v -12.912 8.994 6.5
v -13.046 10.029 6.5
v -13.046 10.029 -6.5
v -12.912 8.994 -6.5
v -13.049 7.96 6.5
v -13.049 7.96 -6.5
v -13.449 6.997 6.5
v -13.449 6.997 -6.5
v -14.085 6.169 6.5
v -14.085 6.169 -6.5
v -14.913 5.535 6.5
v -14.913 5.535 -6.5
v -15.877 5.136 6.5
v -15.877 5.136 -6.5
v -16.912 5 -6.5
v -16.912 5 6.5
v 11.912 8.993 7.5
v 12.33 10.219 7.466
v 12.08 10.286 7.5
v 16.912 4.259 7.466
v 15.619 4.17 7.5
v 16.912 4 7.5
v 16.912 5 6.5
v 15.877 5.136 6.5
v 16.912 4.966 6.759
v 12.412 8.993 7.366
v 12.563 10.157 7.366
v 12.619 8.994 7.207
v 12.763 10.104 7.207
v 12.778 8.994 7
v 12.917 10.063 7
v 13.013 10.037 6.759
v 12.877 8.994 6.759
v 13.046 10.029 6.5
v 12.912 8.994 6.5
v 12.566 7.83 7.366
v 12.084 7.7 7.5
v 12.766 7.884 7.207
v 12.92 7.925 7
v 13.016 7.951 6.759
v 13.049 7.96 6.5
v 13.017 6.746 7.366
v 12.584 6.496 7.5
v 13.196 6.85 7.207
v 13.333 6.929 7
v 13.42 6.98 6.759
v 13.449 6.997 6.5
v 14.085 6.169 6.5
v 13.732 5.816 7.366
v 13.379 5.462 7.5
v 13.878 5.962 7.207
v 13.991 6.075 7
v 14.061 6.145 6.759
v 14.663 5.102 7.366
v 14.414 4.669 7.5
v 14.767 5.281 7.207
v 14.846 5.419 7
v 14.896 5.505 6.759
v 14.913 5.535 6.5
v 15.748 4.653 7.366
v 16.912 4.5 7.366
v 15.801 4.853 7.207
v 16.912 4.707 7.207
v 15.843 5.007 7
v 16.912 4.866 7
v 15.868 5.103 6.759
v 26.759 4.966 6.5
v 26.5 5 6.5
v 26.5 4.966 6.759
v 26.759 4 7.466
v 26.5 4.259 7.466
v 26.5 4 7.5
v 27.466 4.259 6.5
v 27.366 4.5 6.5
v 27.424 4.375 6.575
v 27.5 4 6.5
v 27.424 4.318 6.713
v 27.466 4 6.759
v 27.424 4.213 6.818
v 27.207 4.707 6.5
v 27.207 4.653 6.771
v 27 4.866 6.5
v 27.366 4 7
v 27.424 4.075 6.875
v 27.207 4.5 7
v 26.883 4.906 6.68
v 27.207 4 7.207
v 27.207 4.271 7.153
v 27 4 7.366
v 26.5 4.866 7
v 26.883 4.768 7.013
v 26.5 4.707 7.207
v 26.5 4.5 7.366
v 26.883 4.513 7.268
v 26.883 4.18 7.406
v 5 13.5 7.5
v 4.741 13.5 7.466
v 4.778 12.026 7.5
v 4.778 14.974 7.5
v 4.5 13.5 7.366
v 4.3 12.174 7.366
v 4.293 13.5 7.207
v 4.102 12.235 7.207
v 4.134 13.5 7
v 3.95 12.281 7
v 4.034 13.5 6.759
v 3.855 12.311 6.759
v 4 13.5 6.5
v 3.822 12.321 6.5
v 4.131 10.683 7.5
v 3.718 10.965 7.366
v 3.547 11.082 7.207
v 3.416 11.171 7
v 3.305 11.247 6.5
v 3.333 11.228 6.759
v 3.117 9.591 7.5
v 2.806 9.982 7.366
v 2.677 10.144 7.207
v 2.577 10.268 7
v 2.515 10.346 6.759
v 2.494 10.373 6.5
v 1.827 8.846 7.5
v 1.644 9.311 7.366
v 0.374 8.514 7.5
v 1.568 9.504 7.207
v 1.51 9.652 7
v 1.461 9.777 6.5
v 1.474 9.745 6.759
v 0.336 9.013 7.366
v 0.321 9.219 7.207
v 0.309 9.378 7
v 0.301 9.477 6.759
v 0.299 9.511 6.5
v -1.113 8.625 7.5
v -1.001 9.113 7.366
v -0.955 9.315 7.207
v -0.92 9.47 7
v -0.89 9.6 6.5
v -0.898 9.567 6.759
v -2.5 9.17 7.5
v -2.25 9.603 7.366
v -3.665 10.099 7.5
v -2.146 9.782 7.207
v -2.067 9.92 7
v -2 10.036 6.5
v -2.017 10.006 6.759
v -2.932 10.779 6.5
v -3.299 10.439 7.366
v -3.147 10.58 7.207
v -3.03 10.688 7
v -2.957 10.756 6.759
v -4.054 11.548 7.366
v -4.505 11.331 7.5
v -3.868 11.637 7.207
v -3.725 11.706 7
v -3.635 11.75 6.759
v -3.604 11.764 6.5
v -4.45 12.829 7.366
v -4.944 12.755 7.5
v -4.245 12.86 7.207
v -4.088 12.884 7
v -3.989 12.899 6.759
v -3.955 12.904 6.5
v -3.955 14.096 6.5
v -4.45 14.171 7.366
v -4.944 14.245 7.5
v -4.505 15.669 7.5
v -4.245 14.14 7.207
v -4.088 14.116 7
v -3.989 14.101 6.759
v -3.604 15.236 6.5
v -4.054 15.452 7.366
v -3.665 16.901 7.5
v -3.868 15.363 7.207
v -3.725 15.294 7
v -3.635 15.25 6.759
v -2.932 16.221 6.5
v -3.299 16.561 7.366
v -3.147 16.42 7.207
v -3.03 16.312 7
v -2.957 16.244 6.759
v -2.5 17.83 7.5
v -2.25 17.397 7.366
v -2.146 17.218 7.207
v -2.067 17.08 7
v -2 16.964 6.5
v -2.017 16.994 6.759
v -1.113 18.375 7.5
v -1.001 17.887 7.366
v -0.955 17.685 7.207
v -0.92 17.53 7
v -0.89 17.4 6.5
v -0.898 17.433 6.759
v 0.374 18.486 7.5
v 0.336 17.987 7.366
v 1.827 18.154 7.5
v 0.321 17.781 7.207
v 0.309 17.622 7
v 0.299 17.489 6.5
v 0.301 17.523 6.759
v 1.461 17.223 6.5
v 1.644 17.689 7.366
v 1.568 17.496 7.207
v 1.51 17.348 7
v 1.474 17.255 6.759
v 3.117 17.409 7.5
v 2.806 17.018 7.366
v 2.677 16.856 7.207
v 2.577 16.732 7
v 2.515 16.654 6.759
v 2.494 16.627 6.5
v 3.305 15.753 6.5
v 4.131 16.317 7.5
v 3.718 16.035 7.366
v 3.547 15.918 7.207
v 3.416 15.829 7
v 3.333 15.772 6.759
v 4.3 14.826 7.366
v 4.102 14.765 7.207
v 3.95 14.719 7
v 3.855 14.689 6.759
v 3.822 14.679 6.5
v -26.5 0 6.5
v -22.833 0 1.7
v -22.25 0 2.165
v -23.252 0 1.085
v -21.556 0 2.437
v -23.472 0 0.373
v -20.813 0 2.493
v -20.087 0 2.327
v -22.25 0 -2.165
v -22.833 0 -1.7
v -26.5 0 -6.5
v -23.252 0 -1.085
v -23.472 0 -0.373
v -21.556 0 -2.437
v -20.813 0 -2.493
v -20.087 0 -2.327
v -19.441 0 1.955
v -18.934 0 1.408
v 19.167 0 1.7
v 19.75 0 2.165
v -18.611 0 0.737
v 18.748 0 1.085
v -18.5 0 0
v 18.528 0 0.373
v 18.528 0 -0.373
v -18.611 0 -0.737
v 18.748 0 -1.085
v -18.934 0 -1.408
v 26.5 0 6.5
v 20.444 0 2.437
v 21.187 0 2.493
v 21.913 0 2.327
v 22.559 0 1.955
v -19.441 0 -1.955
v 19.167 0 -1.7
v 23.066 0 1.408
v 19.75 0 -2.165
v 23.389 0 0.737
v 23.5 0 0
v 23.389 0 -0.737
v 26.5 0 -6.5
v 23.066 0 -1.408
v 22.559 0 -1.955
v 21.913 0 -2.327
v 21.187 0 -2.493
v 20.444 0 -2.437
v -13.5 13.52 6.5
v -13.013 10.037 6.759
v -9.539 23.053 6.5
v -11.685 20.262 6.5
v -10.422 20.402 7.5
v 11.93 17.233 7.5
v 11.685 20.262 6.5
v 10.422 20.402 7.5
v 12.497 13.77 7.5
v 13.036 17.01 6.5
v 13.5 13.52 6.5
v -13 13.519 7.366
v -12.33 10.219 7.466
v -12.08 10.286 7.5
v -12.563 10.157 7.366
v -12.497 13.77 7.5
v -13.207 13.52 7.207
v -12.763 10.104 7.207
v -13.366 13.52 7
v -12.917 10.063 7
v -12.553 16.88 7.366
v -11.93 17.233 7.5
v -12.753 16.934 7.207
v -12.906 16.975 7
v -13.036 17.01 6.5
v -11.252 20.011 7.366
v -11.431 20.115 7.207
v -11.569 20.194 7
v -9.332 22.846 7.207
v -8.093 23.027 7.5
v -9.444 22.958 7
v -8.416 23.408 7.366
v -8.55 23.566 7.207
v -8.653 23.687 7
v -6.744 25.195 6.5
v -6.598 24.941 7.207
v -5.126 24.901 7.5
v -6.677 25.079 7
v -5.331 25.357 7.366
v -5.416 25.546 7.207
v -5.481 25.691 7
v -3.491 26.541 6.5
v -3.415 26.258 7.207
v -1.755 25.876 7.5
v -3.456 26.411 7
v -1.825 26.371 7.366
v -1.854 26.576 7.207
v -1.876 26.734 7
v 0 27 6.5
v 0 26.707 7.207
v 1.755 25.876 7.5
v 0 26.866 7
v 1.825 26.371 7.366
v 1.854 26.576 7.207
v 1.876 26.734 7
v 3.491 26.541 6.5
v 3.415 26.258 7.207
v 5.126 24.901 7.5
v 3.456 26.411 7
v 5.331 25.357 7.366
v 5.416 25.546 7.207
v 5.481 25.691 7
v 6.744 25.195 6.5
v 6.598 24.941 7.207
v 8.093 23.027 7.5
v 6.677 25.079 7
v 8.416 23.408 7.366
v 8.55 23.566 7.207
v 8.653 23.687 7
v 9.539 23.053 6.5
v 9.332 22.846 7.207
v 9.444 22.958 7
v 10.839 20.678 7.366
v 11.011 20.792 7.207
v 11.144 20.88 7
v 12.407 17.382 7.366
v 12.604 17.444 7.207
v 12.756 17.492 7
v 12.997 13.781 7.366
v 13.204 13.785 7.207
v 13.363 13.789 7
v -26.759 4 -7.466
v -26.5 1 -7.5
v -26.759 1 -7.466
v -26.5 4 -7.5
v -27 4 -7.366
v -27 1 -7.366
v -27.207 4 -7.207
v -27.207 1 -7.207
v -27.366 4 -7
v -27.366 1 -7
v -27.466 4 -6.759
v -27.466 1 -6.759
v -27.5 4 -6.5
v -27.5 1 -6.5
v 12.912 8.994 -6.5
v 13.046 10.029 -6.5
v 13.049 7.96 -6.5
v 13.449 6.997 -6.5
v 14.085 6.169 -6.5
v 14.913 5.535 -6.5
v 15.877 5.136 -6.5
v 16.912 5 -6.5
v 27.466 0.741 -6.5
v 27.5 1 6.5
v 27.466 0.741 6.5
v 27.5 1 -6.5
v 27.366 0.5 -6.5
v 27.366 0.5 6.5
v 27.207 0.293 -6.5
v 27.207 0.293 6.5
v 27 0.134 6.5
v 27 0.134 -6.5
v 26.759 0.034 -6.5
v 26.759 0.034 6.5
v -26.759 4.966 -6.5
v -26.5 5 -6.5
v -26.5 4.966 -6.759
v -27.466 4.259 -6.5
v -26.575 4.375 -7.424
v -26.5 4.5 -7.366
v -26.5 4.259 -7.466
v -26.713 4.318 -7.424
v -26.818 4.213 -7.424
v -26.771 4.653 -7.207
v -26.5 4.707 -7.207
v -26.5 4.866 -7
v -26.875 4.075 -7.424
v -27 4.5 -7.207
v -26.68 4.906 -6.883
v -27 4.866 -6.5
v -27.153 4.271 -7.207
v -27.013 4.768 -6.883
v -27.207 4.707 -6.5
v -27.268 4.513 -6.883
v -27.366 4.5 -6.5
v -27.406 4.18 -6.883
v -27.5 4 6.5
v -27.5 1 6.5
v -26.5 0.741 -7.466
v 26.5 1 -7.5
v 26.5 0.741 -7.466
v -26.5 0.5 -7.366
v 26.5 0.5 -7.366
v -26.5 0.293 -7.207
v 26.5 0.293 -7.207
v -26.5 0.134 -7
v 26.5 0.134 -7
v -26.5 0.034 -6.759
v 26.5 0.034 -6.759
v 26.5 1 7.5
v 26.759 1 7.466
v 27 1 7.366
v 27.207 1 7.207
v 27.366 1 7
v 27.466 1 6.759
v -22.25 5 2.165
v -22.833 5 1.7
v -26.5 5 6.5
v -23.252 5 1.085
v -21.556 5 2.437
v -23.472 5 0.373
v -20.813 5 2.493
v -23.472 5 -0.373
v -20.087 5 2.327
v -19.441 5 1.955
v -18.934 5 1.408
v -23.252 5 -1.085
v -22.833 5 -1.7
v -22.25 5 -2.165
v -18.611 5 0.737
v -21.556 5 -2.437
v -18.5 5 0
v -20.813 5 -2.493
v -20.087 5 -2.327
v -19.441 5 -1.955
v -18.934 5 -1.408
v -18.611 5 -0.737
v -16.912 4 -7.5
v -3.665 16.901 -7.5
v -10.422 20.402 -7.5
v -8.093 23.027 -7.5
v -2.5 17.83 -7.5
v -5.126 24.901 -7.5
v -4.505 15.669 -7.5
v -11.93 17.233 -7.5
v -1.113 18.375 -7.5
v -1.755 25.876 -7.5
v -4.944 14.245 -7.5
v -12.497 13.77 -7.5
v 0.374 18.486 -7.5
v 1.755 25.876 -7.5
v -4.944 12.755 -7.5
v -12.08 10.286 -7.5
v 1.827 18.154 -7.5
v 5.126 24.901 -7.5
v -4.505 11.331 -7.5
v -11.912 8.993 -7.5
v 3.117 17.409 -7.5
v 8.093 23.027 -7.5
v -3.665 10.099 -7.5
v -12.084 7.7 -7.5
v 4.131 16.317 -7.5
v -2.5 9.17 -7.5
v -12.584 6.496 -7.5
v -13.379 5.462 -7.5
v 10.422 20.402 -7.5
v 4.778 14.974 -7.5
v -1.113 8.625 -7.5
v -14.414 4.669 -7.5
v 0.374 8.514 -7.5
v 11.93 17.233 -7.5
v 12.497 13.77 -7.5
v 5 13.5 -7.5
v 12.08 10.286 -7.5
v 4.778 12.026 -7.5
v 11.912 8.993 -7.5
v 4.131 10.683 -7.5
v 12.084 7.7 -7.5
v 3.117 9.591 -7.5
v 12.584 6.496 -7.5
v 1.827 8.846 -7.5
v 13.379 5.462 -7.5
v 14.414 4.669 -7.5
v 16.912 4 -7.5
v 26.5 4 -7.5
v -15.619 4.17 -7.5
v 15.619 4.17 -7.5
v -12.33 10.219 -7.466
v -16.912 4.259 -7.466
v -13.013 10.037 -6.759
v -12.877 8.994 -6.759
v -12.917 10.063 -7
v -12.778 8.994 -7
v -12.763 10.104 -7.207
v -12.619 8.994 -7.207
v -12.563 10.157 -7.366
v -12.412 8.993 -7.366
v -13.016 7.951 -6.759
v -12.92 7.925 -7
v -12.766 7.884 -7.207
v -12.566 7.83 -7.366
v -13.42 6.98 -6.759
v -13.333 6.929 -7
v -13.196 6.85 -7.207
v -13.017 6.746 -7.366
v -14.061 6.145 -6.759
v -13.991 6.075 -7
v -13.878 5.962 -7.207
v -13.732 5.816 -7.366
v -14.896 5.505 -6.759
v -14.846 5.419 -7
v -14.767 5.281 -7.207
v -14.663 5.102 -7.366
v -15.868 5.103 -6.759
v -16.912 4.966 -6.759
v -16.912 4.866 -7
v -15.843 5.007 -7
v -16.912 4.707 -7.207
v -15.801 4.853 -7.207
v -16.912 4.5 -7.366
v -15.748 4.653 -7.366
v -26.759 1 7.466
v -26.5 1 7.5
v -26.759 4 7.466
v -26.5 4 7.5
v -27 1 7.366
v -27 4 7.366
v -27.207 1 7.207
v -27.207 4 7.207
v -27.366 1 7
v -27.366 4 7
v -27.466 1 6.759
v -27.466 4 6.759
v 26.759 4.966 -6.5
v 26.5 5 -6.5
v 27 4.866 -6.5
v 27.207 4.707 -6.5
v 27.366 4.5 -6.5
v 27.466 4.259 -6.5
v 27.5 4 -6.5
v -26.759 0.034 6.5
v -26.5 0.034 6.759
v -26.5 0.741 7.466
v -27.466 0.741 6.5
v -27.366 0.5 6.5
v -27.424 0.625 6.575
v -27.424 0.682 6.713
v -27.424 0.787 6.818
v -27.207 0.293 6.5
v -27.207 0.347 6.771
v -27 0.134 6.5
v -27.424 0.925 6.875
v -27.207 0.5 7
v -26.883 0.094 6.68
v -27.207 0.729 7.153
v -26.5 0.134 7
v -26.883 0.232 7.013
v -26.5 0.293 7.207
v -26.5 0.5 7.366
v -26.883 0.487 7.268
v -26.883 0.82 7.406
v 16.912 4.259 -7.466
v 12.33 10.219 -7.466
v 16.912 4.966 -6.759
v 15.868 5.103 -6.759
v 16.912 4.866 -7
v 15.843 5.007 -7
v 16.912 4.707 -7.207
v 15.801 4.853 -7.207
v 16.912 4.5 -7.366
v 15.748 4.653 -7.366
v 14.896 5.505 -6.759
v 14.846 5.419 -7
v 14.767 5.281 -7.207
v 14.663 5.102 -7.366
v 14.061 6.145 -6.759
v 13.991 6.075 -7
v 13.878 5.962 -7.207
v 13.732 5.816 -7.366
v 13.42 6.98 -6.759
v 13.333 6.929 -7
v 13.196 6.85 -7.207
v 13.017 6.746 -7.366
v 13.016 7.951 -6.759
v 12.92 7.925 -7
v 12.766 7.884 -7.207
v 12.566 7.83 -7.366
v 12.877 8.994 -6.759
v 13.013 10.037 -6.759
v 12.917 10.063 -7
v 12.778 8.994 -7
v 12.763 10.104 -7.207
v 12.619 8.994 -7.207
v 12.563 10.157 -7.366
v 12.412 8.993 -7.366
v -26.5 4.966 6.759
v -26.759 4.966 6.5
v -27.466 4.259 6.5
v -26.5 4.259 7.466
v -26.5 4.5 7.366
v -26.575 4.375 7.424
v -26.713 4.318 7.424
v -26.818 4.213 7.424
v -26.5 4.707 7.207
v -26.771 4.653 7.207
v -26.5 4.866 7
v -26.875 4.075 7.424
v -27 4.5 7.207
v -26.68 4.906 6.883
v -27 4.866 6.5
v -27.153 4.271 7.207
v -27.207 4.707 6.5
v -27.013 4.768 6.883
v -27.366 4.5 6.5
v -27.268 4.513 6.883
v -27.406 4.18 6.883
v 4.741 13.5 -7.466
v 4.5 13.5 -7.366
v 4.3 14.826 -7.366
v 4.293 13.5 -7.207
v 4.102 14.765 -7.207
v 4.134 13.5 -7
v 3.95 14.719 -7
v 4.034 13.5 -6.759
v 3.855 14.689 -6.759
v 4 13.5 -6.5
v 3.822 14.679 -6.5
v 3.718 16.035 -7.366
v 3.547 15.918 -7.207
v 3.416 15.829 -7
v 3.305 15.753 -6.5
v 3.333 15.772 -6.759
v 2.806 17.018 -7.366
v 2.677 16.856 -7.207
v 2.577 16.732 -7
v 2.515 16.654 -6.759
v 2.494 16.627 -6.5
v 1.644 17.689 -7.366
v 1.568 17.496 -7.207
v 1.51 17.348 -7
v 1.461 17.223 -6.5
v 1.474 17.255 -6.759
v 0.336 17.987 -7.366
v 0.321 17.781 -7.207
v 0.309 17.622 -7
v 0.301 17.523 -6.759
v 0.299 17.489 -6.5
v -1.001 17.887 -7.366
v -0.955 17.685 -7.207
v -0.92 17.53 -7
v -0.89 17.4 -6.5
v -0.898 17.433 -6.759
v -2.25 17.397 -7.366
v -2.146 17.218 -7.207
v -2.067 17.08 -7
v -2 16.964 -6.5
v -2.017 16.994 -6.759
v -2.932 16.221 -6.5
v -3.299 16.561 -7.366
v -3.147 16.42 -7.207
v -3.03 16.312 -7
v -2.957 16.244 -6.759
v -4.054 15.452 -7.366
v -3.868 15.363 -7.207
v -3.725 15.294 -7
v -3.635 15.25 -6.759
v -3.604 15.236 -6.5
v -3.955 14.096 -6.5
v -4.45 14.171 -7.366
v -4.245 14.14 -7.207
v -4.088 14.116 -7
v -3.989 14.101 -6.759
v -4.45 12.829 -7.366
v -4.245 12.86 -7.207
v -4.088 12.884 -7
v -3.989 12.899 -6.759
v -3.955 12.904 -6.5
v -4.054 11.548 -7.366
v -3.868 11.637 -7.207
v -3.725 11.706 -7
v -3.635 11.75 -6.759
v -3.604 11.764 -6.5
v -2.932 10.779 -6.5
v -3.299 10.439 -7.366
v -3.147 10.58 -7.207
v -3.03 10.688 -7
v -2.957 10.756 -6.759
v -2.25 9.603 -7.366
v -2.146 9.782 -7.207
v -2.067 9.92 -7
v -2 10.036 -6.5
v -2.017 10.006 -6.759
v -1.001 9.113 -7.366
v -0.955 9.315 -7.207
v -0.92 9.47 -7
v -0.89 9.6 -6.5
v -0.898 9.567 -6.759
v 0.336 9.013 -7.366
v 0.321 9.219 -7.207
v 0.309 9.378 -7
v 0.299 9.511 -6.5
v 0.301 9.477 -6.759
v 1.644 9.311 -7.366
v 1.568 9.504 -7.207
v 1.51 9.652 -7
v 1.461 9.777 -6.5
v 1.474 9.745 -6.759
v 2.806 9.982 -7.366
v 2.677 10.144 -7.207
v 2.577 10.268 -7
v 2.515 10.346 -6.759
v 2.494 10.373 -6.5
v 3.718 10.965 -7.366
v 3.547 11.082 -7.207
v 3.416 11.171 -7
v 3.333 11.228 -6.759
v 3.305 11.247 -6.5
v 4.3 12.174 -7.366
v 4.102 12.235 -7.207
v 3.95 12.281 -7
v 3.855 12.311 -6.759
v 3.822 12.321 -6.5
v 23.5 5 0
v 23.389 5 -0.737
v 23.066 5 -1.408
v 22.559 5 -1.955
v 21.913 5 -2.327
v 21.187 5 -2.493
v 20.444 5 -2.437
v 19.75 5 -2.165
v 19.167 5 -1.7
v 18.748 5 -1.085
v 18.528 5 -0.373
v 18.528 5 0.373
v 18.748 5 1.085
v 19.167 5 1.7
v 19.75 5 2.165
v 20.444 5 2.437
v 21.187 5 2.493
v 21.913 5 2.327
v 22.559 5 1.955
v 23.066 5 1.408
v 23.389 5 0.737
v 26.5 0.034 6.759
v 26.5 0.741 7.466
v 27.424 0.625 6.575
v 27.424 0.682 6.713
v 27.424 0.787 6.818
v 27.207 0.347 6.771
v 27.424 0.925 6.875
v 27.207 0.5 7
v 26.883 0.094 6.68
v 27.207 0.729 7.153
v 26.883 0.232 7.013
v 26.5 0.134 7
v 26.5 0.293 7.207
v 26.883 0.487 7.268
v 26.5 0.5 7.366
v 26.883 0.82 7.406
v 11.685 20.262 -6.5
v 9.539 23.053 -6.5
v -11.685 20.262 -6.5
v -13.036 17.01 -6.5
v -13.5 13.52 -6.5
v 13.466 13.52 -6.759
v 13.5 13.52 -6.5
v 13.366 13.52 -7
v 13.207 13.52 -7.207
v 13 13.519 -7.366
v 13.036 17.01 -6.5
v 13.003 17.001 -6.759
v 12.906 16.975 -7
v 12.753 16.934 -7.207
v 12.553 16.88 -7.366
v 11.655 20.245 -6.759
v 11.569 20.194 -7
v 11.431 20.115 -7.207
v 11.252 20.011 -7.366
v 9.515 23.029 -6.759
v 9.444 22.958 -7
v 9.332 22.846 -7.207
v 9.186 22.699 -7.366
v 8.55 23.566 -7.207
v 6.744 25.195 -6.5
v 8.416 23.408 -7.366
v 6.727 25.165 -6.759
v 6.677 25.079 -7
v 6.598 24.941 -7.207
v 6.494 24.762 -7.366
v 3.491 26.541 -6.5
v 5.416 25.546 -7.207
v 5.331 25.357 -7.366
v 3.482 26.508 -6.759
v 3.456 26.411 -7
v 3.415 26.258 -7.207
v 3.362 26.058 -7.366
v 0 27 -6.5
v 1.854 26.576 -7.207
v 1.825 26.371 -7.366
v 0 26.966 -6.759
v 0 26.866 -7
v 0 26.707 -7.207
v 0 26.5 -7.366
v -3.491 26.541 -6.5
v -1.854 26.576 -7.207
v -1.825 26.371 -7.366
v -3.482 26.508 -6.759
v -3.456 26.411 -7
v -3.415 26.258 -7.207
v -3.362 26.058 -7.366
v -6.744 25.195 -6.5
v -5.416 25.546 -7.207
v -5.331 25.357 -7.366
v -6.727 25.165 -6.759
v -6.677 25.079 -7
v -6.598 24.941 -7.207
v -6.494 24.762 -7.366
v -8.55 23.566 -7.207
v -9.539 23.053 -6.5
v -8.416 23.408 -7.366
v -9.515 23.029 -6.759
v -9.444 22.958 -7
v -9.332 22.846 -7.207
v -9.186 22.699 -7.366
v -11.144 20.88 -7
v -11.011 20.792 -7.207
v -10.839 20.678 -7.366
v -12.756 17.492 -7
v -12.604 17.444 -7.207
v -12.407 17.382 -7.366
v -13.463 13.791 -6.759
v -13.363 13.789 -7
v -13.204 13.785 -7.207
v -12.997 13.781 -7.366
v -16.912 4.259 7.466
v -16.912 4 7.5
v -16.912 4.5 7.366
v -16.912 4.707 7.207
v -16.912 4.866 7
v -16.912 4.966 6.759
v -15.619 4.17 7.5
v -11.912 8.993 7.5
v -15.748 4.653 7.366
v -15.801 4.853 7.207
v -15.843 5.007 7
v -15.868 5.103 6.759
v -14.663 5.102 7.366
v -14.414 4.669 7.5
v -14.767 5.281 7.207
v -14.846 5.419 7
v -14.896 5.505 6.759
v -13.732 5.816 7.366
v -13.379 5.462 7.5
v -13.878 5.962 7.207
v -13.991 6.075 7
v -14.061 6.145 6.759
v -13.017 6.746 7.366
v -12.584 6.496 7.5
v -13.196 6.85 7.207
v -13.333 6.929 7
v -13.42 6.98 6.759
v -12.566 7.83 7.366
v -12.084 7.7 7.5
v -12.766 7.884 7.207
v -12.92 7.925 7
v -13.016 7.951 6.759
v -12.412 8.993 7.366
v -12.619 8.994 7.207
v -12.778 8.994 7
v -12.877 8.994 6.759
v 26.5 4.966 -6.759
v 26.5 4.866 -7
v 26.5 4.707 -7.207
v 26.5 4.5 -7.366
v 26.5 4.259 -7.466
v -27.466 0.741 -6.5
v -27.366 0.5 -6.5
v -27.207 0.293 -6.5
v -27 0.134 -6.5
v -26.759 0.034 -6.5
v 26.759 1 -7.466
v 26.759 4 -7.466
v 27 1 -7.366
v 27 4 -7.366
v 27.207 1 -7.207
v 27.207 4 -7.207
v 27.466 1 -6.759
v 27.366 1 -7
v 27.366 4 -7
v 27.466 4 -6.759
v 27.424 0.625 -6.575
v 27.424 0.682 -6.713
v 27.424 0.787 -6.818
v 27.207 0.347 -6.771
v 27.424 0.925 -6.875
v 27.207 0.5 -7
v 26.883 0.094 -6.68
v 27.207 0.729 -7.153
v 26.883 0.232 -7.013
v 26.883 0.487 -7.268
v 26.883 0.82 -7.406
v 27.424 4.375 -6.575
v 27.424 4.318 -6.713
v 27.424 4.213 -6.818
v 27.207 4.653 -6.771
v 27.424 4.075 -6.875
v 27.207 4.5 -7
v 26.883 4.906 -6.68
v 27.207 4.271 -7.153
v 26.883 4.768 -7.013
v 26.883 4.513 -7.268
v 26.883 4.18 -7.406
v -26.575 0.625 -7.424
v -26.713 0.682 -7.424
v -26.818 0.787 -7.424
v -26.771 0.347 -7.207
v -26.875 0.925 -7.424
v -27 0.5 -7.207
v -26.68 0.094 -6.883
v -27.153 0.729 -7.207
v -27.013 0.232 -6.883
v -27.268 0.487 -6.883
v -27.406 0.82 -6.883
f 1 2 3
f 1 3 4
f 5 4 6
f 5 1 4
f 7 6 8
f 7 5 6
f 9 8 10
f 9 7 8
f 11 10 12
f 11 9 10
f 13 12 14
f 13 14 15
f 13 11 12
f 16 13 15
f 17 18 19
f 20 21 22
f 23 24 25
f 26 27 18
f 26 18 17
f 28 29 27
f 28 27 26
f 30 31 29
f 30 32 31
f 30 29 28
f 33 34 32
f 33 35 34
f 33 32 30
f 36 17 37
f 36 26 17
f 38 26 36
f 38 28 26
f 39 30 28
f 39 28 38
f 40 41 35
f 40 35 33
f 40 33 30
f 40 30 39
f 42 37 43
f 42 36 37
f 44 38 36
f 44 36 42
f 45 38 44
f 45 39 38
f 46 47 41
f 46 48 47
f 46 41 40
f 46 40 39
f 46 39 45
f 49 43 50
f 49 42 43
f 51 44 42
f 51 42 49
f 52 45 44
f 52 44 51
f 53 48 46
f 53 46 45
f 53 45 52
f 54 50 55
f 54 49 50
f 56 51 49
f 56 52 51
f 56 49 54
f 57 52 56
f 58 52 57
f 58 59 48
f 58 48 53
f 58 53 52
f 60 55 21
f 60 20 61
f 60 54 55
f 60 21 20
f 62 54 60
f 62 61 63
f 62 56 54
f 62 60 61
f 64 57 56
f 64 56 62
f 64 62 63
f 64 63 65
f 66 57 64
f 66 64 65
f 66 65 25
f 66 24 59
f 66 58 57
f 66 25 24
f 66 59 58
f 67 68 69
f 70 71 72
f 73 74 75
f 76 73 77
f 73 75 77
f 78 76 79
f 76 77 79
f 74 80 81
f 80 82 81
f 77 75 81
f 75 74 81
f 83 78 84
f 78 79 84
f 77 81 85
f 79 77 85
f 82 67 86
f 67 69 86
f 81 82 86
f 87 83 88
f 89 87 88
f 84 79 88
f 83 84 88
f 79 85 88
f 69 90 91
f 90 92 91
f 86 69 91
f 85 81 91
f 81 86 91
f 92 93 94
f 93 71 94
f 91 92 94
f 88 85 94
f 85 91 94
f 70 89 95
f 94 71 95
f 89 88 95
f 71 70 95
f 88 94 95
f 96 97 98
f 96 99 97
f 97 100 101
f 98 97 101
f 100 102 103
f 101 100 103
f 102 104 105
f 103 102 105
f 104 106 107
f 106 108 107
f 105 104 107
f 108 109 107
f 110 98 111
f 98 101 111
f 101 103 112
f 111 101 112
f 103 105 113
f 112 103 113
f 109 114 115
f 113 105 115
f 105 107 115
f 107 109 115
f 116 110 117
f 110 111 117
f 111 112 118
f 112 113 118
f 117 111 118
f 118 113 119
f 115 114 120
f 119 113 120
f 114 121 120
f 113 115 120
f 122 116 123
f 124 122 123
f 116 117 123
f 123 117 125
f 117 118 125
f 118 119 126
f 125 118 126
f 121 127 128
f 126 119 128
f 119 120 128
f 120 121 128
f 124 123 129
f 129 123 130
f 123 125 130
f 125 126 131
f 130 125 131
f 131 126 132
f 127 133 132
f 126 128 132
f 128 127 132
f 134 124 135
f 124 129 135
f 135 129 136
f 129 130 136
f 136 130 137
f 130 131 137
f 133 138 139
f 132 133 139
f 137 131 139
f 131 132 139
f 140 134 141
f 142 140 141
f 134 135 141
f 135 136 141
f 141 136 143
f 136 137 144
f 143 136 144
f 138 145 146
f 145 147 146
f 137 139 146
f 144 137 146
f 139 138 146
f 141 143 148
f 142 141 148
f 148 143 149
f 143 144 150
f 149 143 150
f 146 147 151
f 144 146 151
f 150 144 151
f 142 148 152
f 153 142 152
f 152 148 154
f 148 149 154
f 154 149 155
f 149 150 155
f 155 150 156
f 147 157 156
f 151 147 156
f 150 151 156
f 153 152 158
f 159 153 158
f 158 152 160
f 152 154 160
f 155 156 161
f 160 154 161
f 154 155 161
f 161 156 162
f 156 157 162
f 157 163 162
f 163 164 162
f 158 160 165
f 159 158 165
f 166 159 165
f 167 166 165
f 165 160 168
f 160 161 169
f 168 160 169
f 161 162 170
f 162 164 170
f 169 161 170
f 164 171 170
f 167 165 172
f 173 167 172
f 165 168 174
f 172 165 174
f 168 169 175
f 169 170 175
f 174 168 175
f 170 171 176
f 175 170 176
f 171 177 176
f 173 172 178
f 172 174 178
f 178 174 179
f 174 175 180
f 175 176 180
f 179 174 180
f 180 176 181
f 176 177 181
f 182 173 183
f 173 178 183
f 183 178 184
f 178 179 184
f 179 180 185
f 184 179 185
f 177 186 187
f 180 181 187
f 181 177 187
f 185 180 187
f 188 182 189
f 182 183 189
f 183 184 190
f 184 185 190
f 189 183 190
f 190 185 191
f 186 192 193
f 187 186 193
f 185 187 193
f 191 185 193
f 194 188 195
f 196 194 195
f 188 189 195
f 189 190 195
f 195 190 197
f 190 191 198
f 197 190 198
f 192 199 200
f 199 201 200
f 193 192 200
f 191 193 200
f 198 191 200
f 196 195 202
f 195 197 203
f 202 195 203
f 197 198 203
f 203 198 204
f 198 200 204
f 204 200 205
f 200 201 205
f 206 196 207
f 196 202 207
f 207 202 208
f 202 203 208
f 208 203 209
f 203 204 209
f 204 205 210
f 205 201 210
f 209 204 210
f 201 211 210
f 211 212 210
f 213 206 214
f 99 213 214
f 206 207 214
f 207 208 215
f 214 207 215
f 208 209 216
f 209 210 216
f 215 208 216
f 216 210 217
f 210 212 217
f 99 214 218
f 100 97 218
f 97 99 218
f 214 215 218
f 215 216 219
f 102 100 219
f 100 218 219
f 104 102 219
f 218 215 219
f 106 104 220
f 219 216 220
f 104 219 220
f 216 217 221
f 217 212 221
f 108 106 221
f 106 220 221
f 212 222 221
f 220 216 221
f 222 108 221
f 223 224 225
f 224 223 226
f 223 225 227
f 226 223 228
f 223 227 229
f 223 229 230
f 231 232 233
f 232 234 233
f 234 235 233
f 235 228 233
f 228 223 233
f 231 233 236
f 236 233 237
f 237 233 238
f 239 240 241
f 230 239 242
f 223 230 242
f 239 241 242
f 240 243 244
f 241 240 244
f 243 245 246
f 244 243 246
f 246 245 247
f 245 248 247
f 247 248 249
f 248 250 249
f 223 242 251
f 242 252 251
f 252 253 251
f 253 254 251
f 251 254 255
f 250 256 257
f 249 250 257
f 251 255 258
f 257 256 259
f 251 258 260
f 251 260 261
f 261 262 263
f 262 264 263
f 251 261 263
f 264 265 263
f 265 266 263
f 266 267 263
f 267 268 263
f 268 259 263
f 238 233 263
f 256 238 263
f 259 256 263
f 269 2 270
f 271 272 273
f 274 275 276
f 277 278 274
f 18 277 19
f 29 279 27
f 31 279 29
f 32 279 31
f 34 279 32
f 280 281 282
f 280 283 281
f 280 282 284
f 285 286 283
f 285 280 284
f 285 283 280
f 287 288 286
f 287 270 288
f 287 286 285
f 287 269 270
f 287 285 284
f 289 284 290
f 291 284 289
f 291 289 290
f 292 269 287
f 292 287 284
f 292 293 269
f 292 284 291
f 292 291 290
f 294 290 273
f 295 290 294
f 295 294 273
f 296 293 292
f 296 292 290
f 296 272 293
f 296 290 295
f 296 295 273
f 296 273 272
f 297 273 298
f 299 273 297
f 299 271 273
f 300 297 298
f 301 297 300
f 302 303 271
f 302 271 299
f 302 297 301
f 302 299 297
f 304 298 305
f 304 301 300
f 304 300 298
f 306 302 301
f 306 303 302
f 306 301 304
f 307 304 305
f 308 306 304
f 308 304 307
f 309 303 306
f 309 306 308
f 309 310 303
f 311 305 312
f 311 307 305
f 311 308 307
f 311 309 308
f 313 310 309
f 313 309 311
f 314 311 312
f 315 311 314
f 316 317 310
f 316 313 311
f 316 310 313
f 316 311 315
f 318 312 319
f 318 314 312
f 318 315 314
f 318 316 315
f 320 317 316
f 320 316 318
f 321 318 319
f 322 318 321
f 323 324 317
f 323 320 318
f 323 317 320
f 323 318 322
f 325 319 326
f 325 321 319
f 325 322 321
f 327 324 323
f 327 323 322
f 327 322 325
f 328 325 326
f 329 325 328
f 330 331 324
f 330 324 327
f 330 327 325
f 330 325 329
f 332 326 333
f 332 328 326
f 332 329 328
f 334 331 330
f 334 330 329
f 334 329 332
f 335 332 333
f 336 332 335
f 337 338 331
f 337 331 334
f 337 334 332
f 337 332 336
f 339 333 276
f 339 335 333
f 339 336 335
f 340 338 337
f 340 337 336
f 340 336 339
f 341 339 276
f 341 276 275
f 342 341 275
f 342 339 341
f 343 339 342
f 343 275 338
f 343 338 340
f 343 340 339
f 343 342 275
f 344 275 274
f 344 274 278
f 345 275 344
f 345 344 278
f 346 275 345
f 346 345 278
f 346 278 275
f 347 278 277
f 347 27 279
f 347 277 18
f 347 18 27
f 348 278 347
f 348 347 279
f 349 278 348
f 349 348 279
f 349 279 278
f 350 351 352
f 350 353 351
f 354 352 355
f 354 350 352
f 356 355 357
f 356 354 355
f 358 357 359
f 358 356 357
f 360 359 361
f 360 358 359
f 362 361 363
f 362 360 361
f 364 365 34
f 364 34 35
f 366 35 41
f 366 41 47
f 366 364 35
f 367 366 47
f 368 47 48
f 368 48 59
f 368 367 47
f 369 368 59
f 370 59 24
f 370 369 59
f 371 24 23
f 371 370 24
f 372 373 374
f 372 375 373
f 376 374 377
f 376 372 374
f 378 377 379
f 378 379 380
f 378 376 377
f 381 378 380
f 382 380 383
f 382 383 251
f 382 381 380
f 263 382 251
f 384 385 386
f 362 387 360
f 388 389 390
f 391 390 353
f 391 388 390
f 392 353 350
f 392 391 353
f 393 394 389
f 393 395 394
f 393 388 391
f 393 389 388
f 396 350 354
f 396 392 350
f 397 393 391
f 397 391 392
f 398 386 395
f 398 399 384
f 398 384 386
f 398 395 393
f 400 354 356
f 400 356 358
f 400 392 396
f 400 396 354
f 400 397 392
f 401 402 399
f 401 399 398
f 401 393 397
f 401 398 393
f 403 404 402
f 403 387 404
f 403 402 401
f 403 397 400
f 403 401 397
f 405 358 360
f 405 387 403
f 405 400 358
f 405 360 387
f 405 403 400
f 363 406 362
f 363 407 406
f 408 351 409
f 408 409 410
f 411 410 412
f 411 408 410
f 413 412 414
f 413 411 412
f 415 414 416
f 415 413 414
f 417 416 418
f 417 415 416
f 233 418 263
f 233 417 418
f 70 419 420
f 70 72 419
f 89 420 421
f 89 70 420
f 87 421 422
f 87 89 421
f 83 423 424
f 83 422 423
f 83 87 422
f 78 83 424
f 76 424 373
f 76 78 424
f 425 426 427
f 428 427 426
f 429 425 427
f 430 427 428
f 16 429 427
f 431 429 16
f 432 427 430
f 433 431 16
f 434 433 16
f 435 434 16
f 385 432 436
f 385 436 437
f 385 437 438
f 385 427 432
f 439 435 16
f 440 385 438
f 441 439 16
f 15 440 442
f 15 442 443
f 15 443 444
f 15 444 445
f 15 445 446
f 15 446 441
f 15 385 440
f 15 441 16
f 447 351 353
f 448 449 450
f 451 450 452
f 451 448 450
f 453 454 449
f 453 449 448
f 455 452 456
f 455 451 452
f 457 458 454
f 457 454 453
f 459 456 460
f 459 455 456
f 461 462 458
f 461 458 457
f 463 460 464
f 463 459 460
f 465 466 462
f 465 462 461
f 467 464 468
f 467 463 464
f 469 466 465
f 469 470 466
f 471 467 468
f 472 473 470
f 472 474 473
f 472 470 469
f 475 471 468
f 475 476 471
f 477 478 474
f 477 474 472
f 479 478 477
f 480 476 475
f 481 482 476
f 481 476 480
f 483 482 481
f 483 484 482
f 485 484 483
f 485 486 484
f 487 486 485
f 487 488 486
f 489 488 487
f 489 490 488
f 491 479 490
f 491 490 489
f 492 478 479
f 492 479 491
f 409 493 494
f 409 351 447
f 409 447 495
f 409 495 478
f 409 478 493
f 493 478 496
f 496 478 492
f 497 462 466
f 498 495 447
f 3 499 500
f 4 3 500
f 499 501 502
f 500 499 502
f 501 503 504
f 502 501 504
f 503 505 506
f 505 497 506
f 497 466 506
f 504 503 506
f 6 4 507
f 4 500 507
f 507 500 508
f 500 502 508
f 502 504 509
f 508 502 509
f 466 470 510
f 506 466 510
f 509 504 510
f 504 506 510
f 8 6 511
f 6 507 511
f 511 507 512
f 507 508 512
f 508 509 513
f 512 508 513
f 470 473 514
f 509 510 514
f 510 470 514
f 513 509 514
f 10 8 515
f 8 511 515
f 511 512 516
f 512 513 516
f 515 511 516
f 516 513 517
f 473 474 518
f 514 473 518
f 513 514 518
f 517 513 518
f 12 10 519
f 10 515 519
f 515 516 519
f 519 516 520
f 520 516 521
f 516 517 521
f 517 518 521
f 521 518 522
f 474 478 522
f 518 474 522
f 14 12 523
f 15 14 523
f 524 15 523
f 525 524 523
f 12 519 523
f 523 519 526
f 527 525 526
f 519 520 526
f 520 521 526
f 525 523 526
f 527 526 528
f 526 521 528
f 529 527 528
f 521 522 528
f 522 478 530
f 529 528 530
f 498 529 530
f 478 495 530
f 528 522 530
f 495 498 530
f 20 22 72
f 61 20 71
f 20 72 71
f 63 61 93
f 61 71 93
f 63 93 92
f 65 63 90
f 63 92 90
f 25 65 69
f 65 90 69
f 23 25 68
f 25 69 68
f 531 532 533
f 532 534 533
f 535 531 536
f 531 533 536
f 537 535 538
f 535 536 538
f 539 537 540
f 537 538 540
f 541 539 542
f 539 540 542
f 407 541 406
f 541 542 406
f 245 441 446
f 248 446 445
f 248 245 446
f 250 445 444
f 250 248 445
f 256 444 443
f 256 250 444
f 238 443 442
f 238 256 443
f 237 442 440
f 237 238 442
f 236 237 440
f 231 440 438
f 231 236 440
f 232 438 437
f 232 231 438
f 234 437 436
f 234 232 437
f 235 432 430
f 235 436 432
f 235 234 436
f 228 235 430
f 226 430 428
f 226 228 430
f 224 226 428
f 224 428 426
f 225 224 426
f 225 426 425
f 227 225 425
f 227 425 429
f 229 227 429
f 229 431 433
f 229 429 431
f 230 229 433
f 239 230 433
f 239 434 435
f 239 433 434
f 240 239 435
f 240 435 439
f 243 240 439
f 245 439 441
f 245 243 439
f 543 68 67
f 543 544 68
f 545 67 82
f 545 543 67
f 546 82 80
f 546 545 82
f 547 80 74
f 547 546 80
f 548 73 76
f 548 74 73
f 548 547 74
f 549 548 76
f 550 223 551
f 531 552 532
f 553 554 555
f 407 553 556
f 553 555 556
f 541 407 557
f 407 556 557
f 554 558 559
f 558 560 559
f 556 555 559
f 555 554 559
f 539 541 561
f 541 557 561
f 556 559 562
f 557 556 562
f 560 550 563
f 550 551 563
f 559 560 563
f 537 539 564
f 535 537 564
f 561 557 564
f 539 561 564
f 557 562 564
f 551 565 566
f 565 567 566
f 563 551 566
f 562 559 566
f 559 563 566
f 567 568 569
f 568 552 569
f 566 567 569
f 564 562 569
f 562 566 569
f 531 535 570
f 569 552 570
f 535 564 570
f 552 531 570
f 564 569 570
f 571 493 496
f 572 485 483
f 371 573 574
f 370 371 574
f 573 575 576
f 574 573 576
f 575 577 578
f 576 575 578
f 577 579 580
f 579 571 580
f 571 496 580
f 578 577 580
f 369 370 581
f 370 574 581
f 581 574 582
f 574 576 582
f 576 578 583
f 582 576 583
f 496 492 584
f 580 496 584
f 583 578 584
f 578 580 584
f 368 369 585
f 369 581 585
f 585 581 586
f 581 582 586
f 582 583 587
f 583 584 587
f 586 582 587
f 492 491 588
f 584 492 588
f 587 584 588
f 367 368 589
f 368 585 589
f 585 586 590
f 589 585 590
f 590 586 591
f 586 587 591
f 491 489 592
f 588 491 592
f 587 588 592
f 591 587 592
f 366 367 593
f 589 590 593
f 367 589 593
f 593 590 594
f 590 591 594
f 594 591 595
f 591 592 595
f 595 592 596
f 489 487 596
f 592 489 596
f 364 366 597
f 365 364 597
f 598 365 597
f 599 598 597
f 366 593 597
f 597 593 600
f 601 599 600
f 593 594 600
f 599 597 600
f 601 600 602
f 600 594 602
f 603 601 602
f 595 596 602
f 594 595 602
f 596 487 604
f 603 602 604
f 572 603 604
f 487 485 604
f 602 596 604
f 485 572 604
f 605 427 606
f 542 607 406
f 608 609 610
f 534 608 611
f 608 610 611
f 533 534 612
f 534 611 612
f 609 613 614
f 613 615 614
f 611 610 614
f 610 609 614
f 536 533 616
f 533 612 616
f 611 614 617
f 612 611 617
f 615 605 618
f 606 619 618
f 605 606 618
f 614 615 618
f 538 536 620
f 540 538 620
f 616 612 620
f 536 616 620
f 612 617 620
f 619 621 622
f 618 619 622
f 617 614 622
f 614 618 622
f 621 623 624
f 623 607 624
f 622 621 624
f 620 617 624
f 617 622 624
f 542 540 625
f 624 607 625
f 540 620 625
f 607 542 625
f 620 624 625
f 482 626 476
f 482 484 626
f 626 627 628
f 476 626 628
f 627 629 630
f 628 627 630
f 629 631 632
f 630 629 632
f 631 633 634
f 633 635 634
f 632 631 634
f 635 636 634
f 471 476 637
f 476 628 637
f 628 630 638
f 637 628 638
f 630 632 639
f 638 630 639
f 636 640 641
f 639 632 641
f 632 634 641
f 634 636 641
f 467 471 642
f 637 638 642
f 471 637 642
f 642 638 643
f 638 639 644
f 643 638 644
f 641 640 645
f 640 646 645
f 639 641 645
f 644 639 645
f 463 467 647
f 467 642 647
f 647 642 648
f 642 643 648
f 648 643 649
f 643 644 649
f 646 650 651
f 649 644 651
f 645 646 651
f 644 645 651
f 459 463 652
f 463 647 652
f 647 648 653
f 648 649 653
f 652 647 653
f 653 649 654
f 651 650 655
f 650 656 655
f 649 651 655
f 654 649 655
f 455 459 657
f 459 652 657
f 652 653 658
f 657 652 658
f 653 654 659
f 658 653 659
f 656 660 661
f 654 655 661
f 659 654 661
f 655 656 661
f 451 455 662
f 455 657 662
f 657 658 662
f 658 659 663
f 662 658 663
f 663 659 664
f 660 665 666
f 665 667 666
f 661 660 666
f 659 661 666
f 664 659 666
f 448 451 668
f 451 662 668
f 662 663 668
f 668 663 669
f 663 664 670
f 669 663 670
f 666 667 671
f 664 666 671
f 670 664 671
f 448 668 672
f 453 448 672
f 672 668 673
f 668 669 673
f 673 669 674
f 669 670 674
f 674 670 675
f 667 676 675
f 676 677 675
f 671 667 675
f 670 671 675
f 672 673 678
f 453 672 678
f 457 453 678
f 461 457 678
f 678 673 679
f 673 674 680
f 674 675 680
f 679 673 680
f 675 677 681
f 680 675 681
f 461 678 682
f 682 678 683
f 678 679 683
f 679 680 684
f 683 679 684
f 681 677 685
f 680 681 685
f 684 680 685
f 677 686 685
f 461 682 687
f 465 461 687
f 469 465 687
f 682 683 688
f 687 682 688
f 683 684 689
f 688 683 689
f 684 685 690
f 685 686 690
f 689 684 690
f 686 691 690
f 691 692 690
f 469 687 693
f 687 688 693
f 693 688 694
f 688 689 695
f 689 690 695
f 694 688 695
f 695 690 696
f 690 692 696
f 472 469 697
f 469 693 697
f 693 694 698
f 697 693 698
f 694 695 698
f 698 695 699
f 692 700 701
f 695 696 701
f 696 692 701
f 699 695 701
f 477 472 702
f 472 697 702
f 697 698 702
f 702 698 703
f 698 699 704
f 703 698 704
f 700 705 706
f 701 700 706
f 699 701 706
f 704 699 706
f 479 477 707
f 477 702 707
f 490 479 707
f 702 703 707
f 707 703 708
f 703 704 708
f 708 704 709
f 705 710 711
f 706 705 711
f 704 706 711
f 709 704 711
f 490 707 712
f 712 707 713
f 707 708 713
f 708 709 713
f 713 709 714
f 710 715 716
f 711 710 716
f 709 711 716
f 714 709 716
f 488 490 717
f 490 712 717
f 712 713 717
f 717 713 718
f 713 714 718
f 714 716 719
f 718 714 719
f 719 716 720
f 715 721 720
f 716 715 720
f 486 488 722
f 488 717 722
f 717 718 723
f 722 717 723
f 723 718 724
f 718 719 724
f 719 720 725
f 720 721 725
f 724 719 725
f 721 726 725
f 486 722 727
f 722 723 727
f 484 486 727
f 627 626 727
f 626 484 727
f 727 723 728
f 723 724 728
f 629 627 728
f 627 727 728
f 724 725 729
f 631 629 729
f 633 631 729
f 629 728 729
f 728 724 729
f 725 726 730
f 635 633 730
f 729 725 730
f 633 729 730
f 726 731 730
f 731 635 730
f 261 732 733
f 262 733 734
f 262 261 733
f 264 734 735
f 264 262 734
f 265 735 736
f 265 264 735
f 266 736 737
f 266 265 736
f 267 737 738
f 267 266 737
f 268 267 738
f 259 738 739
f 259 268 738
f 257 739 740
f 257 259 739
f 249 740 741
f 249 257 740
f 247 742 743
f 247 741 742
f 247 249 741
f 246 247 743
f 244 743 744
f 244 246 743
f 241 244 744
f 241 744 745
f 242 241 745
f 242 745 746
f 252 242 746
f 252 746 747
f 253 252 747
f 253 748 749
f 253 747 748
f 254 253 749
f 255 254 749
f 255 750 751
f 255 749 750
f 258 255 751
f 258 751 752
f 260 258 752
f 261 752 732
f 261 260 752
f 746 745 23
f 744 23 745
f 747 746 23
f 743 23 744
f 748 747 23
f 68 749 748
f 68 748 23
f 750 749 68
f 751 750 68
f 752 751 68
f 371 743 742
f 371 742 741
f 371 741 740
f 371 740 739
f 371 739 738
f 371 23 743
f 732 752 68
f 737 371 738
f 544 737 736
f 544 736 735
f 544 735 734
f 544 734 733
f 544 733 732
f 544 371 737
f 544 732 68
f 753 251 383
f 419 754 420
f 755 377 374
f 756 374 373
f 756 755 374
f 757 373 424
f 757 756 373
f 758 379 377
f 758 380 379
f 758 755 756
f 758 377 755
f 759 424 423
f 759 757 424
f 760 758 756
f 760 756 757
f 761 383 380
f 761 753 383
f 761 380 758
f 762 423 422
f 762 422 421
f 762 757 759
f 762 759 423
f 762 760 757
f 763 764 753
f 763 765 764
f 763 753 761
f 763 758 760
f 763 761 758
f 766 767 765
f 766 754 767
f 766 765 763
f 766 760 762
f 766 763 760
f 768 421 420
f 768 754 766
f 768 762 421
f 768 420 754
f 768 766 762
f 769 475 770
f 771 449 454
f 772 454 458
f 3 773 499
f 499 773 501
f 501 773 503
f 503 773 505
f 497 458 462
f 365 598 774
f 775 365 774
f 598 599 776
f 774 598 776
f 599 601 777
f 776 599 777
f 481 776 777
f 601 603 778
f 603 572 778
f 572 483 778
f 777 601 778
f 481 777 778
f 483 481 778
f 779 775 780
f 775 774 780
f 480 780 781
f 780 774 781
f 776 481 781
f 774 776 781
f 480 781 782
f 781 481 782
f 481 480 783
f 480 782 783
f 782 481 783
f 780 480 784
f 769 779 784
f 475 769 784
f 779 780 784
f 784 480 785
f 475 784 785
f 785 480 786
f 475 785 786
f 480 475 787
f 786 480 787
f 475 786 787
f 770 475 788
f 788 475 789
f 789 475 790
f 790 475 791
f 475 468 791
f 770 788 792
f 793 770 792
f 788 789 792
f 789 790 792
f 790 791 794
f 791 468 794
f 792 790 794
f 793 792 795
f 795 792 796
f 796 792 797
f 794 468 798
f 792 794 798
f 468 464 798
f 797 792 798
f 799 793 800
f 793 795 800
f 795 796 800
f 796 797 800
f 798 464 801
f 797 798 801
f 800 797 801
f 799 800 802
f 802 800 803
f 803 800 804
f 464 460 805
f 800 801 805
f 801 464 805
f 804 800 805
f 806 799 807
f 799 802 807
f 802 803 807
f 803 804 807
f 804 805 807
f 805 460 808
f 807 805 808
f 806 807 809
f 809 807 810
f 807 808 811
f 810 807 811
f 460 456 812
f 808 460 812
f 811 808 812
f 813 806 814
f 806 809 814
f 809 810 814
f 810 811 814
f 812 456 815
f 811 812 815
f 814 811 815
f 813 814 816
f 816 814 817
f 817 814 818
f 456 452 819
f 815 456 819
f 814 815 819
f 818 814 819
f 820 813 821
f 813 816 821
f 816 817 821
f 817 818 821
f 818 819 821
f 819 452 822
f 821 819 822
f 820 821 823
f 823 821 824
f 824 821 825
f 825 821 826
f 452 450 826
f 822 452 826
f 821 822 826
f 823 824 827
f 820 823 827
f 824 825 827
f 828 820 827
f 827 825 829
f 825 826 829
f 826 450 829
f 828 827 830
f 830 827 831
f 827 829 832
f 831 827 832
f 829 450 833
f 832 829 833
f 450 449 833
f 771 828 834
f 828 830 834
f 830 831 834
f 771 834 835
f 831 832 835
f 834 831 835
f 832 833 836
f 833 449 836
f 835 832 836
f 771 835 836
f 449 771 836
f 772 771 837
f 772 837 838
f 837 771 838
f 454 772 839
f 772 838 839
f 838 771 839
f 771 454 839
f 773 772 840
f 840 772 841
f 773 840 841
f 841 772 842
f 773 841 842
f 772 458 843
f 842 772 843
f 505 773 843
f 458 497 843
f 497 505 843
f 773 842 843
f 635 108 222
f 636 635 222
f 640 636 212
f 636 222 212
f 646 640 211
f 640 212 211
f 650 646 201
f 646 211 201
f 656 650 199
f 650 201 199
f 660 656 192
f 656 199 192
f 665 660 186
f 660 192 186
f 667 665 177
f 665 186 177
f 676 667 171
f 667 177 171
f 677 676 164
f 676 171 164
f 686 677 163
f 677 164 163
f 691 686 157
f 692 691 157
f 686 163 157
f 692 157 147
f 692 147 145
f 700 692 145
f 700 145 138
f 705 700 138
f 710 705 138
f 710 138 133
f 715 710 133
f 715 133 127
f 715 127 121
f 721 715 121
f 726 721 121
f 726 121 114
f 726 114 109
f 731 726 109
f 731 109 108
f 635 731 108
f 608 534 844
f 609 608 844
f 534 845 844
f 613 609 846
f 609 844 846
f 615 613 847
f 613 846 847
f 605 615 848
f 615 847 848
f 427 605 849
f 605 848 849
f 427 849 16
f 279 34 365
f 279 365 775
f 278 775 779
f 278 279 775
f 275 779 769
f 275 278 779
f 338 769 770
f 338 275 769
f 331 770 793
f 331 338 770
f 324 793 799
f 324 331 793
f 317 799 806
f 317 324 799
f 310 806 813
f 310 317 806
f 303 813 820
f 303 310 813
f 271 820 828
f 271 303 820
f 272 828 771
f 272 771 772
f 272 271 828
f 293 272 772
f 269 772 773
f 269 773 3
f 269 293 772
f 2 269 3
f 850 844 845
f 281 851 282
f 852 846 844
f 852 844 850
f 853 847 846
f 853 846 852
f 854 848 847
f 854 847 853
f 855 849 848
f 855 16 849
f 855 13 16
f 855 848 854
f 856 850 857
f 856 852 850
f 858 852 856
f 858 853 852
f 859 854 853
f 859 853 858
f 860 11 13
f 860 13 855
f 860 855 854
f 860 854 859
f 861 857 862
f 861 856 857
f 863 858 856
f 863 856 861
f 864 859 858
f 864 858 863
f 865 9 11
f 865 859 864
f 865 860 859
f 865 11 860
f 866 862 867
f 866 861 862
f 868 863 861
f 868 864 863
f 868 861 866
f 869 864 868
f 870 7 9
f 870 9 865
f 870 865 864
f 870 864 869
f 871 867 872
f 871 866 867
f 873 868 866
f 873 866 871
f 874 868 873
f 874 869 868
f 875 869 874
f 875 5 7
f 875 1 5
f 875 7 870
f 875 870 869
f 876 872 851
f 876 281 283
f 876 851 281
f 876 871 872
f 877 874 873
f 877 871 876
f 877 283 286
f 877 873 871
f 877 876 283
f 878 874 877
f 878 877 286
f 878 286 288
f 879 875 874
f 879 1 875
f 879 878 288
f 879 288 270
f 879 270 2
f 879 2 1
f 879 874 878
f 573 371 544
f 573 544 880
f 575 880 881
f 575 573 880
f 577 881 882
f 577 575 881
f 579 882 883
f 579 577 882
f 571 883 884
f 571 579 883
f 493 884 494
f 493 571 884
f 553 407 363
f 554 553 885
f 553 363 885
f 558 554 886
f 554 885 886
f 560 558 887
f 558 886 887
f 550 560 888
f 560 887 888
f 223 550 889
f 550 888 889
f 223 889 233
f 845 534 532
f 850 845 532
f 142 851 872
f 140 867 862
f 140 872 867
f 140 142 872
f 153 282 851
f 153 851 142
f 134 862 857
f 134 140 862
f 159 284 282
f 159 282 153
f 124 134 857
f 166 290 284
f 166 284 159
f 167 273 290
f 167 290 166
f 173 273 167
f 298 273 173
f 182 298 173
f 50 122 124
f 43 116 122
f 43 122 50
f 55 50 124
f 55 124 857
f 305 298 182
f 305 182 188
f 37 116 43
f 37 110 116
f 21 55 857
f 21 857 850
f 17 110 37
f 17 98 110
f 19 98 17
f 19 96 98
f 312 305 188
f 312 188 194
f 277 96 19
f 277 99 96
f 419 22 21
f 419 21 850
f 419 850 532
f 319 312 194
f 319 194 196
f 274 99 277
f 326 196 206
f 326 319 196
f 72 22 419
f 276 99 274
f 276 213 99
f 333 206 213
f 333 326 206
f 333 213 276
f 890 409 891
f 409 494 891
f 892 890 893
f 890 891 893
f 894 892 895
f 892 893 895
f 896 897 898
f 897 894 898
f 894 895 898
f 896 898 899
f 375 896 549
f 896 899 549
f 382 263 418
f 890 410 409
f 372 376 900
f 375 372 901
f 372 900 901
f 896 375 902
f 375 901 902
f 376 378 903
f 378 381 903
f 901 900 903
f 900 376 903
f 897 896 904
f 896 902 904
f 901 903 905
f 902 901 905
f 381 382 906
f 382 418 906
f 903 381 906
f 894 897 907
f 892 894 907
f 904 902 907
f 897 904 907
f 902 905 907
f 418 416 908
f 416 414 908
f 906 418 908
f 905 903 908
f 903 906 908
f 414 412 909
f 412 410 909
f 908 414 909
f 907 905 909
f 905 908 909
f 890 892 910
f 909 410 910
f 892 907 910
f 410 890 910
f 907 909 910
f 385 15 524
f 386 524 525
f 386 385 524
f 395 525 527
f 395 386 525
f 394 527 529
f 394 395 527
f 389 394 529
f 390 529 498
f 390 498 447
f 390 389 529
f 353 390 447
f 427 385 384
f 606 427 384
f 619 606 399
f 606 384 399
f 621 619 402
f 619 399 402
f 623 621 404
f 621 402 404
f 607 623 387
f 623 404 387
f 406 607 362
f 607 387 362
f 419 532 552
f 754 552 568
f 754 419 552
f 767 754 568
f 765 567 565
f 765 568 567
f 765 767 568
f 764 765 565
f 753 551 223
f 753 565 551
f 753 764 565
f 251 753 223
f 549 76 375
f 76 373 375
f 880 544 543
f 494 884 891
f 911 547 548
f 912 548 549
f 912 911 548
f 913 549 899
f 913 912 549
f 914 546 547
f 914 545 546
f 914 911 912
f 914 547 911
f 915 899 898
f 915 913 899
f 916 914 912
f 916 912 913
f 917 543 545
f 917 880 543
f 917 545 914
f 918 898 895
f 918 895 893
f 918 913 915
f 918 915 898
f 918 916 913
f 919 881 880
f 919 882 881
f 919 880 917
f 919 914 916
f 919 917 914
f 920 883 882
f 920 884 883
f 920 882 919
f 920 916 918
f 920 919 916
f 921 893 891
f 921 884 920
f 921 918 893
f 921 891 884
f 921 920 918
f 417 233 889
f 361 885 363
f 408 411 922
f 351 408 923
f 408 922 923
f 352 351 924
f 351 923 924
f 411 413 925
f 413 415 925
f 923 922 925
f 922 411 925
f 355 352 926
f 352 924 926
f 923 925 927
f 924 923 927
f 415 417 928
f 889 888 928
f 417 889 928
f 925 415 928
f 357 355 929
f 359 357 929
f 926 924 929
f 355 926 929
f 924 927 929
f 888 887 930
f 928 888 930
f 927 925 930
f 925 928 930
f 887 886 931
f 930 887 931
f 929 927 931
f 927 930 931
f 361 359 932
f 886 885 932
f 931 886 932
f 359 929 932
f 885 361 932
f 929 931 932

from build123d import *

# Parameters (mm, degrees)
SCHIZZO1_W                               = 55
SCHIZZO1_H                               = 15
ESTRUSIONE_ESTRUSIONE1_DEPTH             = 5
ESTRUSIONE_ESTRUSIONE2_REACH             = 9.5
SCHIZZO2_R                               = 13.5
SCHIZZO2_R_2                             = 4
ESTRUSIONE_ESTRUSIONE2_DIRECTION_2_REACH = 9.5
RACCORDO1_R                              = 4
RACCORDO2_R                              = 1
SCHIZZO3_R                               = 2.5
TAGLIO_ESTRUSIONE1_DEPTH                 = 28


with BuildPart() as part:
    # Schizzo1 → Estrusione-Estrusione1 (new body)
    with BuildSketch(Plane(origin=(0, 0, 0), x_dir=(1, 0, 0), z_dir=(0, 1, 0))):
        Rectangle(SCHIZZO1_W, SCHIZZO1_H)
    extrude(amount=ESTRUSIONE_ESTRUSIONE1_DEPTH)

    # Estrusione-Estrusione2: up to this face of the body (flat: up to its plane)
    estrusione_estrusione2_end = Plane(part.part.faces().sort_by_distance((0, 2.5, 7.5))[0])
    # Schizzo2 → Estrusione-Estrusione2 (add, up to the picked face)
    with BuildSketch(Plane.XY, mode=Mode.PRIVATE) as estrusione_estrusione2_sk1:
        with Locations((0, 13.5)):
            Circle(SCHIZZO2_R)
        with Locations((0, 13.5)):
            Circle(SCHIZZO2_R_2, mode=Mode.SUBTRACT)
    estrusione_estrusione2_tool1 = split(extrude(estrusione_estrusione2_sk1.sketch, amount=ESTRUSIONE_ESTRUSIONE2_REACH, mode=Mode.PRIVATE), bisect_by=estrusione_estrusione2_end, keep=Keep.BOTH, mode=Mode.PRIVATE)
    add(estrusione_estrusione2_tool1.solids().sort_by_distance((-13.118162, 13.5, 0))[0])

    # Estrusione-Estrusione2 direction 2: up to this face of the body (flat: up to its plane)
    estrusione_estrusione2_direction_2_end = Plane(part.part.faces().sort_by_distance((0, 2.5, -7.5))[0])
    # Schizzo2 → Estrusione-Estrusione2 direction 2 (add, up to the picked face)
    with BuildSketch(Plane.XY, mode=Mode.PRIVATE) as estrusione_estrusione2_direction_2_sk1:
        with Locations((0, 13.5)):
            Circle(SCHIZZO2_R)
        with Locations((0, 13.5)):
            Circle(SCHIZZO2_R_2, mode=Mode.SUBTRACT)
    estrusione_estrusione2_direction_2_tool1 = split(extrude(estrusione_estrusione2_direction_2_sk1.sketch, amount=-ESTRUSIONE_ESTRUSIONE2_DIRECTION_2_REACH, mode=Mode.PRIVATE), bisect_by=estrusione_estrusione2_direction_2_end, keep=Keep.BOTH, mode=Mode.PRIVATE)
    add(estrusione_estrusione2_direction_2_tool1.solids().sort_by_distance((-13.118162, 13.5, 0))[0])

    # Raccordo1
    raccordo1_edges = [part.edges().sort_by_distance(p)[0] for p in [
        (10.488088482, 5, 0),
        (-10.488088482, 5, 0),
    ]]
    fillet(raccordo1_edges, radius=RACCORDO1_R)

    # Raccordo2
    raccordo2_edges = [part.edges().sort_by_distance(p)[0] for p in [
        (-27.5, 5, 0),
        (-22.205767263, 5, 7.5),
        (-4, 13.5, -7.5),
        (-4, 13.5, 7.5),
        (22.205767263, 5, 7.5),
        (0, 27, -7.5),
        (0, 27, 7.5),
        (-22.205767263, 5, -7.5),
        (13.740234657, 6.562202399, 7.5),
        (13.740234657, 6.562202399, -7.5),
        (-13.740234657, 6.562202399, -7.5),
        (-13.740234657, 6.562202399, 7.5),
        (27.5, 5, 0),
        (0, 0, 7.5),
        (-27.5, 0, 0),
        (0, 0, -7.5),
        (27.5, 0, 0),
        (27.5, 2.5, 7.5),
        (-27.5, 2.5, 7.5),
        (-27.5, 2.5, -7.5),
        (27.5, 2.5, -7.5),
        (22.205767263, 5, -7.5),
    ]]
    fillet(raccordo2_edges, radius=RACCORDO2_R)

    # Schizzo3 → Taglio-Estrusione1 (cut, through all)
    with BuildSketch(Plane(origin=(0, 0, 0), x_dir=(1, 0, 0), z_dir=(0, 1, 0))):
        with Locations((21, 0)):
            Circle(SCHIZZO3_R)
        with Locations((-21, 0)):
            Circle(SCHIZZO3_R)
    extrude(amount=TAGLIO_ESTRUSIONE1_DEPTH, mode=Mode.SUBTRACT)


solid = part.part
